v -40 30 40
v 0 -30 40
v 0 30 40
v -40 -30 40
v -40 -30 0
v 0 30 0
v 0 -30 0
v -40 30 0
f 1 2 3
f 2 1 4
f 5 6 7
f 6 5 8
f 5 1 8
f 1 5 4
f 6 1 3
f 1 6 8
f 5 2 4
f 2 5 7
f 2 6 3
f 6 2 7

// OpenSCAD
// Two-part box enclosure for a small electronics board, printed as one piece with a part
// between them. NOVEL general part.
//

box_x   = 70;
box_y   = 50;
box_z   = 30;
wall    = 2;
floor   = 2;

lip_t   = 1.5;
lip_h   = 4;
clearance = 0.2;

$fn = 48;

part_size_x = box_x + 10;
part_size_y = box_y + 10;
part_size_z = box_z + 10;

difference() {
    translate([-part_size_x / 2, -part_size_y / 2, 0]) cube([part_size_x, part_size_y, part_size_z]);
    // A vertical plane through the centre, 1 mm thick, splitting the part into two solid blocks
    translate([0, -part_size_y / 2 - 1, 0]) cube([part_size_x, part_size_y + 2, part_size_z]);
}
